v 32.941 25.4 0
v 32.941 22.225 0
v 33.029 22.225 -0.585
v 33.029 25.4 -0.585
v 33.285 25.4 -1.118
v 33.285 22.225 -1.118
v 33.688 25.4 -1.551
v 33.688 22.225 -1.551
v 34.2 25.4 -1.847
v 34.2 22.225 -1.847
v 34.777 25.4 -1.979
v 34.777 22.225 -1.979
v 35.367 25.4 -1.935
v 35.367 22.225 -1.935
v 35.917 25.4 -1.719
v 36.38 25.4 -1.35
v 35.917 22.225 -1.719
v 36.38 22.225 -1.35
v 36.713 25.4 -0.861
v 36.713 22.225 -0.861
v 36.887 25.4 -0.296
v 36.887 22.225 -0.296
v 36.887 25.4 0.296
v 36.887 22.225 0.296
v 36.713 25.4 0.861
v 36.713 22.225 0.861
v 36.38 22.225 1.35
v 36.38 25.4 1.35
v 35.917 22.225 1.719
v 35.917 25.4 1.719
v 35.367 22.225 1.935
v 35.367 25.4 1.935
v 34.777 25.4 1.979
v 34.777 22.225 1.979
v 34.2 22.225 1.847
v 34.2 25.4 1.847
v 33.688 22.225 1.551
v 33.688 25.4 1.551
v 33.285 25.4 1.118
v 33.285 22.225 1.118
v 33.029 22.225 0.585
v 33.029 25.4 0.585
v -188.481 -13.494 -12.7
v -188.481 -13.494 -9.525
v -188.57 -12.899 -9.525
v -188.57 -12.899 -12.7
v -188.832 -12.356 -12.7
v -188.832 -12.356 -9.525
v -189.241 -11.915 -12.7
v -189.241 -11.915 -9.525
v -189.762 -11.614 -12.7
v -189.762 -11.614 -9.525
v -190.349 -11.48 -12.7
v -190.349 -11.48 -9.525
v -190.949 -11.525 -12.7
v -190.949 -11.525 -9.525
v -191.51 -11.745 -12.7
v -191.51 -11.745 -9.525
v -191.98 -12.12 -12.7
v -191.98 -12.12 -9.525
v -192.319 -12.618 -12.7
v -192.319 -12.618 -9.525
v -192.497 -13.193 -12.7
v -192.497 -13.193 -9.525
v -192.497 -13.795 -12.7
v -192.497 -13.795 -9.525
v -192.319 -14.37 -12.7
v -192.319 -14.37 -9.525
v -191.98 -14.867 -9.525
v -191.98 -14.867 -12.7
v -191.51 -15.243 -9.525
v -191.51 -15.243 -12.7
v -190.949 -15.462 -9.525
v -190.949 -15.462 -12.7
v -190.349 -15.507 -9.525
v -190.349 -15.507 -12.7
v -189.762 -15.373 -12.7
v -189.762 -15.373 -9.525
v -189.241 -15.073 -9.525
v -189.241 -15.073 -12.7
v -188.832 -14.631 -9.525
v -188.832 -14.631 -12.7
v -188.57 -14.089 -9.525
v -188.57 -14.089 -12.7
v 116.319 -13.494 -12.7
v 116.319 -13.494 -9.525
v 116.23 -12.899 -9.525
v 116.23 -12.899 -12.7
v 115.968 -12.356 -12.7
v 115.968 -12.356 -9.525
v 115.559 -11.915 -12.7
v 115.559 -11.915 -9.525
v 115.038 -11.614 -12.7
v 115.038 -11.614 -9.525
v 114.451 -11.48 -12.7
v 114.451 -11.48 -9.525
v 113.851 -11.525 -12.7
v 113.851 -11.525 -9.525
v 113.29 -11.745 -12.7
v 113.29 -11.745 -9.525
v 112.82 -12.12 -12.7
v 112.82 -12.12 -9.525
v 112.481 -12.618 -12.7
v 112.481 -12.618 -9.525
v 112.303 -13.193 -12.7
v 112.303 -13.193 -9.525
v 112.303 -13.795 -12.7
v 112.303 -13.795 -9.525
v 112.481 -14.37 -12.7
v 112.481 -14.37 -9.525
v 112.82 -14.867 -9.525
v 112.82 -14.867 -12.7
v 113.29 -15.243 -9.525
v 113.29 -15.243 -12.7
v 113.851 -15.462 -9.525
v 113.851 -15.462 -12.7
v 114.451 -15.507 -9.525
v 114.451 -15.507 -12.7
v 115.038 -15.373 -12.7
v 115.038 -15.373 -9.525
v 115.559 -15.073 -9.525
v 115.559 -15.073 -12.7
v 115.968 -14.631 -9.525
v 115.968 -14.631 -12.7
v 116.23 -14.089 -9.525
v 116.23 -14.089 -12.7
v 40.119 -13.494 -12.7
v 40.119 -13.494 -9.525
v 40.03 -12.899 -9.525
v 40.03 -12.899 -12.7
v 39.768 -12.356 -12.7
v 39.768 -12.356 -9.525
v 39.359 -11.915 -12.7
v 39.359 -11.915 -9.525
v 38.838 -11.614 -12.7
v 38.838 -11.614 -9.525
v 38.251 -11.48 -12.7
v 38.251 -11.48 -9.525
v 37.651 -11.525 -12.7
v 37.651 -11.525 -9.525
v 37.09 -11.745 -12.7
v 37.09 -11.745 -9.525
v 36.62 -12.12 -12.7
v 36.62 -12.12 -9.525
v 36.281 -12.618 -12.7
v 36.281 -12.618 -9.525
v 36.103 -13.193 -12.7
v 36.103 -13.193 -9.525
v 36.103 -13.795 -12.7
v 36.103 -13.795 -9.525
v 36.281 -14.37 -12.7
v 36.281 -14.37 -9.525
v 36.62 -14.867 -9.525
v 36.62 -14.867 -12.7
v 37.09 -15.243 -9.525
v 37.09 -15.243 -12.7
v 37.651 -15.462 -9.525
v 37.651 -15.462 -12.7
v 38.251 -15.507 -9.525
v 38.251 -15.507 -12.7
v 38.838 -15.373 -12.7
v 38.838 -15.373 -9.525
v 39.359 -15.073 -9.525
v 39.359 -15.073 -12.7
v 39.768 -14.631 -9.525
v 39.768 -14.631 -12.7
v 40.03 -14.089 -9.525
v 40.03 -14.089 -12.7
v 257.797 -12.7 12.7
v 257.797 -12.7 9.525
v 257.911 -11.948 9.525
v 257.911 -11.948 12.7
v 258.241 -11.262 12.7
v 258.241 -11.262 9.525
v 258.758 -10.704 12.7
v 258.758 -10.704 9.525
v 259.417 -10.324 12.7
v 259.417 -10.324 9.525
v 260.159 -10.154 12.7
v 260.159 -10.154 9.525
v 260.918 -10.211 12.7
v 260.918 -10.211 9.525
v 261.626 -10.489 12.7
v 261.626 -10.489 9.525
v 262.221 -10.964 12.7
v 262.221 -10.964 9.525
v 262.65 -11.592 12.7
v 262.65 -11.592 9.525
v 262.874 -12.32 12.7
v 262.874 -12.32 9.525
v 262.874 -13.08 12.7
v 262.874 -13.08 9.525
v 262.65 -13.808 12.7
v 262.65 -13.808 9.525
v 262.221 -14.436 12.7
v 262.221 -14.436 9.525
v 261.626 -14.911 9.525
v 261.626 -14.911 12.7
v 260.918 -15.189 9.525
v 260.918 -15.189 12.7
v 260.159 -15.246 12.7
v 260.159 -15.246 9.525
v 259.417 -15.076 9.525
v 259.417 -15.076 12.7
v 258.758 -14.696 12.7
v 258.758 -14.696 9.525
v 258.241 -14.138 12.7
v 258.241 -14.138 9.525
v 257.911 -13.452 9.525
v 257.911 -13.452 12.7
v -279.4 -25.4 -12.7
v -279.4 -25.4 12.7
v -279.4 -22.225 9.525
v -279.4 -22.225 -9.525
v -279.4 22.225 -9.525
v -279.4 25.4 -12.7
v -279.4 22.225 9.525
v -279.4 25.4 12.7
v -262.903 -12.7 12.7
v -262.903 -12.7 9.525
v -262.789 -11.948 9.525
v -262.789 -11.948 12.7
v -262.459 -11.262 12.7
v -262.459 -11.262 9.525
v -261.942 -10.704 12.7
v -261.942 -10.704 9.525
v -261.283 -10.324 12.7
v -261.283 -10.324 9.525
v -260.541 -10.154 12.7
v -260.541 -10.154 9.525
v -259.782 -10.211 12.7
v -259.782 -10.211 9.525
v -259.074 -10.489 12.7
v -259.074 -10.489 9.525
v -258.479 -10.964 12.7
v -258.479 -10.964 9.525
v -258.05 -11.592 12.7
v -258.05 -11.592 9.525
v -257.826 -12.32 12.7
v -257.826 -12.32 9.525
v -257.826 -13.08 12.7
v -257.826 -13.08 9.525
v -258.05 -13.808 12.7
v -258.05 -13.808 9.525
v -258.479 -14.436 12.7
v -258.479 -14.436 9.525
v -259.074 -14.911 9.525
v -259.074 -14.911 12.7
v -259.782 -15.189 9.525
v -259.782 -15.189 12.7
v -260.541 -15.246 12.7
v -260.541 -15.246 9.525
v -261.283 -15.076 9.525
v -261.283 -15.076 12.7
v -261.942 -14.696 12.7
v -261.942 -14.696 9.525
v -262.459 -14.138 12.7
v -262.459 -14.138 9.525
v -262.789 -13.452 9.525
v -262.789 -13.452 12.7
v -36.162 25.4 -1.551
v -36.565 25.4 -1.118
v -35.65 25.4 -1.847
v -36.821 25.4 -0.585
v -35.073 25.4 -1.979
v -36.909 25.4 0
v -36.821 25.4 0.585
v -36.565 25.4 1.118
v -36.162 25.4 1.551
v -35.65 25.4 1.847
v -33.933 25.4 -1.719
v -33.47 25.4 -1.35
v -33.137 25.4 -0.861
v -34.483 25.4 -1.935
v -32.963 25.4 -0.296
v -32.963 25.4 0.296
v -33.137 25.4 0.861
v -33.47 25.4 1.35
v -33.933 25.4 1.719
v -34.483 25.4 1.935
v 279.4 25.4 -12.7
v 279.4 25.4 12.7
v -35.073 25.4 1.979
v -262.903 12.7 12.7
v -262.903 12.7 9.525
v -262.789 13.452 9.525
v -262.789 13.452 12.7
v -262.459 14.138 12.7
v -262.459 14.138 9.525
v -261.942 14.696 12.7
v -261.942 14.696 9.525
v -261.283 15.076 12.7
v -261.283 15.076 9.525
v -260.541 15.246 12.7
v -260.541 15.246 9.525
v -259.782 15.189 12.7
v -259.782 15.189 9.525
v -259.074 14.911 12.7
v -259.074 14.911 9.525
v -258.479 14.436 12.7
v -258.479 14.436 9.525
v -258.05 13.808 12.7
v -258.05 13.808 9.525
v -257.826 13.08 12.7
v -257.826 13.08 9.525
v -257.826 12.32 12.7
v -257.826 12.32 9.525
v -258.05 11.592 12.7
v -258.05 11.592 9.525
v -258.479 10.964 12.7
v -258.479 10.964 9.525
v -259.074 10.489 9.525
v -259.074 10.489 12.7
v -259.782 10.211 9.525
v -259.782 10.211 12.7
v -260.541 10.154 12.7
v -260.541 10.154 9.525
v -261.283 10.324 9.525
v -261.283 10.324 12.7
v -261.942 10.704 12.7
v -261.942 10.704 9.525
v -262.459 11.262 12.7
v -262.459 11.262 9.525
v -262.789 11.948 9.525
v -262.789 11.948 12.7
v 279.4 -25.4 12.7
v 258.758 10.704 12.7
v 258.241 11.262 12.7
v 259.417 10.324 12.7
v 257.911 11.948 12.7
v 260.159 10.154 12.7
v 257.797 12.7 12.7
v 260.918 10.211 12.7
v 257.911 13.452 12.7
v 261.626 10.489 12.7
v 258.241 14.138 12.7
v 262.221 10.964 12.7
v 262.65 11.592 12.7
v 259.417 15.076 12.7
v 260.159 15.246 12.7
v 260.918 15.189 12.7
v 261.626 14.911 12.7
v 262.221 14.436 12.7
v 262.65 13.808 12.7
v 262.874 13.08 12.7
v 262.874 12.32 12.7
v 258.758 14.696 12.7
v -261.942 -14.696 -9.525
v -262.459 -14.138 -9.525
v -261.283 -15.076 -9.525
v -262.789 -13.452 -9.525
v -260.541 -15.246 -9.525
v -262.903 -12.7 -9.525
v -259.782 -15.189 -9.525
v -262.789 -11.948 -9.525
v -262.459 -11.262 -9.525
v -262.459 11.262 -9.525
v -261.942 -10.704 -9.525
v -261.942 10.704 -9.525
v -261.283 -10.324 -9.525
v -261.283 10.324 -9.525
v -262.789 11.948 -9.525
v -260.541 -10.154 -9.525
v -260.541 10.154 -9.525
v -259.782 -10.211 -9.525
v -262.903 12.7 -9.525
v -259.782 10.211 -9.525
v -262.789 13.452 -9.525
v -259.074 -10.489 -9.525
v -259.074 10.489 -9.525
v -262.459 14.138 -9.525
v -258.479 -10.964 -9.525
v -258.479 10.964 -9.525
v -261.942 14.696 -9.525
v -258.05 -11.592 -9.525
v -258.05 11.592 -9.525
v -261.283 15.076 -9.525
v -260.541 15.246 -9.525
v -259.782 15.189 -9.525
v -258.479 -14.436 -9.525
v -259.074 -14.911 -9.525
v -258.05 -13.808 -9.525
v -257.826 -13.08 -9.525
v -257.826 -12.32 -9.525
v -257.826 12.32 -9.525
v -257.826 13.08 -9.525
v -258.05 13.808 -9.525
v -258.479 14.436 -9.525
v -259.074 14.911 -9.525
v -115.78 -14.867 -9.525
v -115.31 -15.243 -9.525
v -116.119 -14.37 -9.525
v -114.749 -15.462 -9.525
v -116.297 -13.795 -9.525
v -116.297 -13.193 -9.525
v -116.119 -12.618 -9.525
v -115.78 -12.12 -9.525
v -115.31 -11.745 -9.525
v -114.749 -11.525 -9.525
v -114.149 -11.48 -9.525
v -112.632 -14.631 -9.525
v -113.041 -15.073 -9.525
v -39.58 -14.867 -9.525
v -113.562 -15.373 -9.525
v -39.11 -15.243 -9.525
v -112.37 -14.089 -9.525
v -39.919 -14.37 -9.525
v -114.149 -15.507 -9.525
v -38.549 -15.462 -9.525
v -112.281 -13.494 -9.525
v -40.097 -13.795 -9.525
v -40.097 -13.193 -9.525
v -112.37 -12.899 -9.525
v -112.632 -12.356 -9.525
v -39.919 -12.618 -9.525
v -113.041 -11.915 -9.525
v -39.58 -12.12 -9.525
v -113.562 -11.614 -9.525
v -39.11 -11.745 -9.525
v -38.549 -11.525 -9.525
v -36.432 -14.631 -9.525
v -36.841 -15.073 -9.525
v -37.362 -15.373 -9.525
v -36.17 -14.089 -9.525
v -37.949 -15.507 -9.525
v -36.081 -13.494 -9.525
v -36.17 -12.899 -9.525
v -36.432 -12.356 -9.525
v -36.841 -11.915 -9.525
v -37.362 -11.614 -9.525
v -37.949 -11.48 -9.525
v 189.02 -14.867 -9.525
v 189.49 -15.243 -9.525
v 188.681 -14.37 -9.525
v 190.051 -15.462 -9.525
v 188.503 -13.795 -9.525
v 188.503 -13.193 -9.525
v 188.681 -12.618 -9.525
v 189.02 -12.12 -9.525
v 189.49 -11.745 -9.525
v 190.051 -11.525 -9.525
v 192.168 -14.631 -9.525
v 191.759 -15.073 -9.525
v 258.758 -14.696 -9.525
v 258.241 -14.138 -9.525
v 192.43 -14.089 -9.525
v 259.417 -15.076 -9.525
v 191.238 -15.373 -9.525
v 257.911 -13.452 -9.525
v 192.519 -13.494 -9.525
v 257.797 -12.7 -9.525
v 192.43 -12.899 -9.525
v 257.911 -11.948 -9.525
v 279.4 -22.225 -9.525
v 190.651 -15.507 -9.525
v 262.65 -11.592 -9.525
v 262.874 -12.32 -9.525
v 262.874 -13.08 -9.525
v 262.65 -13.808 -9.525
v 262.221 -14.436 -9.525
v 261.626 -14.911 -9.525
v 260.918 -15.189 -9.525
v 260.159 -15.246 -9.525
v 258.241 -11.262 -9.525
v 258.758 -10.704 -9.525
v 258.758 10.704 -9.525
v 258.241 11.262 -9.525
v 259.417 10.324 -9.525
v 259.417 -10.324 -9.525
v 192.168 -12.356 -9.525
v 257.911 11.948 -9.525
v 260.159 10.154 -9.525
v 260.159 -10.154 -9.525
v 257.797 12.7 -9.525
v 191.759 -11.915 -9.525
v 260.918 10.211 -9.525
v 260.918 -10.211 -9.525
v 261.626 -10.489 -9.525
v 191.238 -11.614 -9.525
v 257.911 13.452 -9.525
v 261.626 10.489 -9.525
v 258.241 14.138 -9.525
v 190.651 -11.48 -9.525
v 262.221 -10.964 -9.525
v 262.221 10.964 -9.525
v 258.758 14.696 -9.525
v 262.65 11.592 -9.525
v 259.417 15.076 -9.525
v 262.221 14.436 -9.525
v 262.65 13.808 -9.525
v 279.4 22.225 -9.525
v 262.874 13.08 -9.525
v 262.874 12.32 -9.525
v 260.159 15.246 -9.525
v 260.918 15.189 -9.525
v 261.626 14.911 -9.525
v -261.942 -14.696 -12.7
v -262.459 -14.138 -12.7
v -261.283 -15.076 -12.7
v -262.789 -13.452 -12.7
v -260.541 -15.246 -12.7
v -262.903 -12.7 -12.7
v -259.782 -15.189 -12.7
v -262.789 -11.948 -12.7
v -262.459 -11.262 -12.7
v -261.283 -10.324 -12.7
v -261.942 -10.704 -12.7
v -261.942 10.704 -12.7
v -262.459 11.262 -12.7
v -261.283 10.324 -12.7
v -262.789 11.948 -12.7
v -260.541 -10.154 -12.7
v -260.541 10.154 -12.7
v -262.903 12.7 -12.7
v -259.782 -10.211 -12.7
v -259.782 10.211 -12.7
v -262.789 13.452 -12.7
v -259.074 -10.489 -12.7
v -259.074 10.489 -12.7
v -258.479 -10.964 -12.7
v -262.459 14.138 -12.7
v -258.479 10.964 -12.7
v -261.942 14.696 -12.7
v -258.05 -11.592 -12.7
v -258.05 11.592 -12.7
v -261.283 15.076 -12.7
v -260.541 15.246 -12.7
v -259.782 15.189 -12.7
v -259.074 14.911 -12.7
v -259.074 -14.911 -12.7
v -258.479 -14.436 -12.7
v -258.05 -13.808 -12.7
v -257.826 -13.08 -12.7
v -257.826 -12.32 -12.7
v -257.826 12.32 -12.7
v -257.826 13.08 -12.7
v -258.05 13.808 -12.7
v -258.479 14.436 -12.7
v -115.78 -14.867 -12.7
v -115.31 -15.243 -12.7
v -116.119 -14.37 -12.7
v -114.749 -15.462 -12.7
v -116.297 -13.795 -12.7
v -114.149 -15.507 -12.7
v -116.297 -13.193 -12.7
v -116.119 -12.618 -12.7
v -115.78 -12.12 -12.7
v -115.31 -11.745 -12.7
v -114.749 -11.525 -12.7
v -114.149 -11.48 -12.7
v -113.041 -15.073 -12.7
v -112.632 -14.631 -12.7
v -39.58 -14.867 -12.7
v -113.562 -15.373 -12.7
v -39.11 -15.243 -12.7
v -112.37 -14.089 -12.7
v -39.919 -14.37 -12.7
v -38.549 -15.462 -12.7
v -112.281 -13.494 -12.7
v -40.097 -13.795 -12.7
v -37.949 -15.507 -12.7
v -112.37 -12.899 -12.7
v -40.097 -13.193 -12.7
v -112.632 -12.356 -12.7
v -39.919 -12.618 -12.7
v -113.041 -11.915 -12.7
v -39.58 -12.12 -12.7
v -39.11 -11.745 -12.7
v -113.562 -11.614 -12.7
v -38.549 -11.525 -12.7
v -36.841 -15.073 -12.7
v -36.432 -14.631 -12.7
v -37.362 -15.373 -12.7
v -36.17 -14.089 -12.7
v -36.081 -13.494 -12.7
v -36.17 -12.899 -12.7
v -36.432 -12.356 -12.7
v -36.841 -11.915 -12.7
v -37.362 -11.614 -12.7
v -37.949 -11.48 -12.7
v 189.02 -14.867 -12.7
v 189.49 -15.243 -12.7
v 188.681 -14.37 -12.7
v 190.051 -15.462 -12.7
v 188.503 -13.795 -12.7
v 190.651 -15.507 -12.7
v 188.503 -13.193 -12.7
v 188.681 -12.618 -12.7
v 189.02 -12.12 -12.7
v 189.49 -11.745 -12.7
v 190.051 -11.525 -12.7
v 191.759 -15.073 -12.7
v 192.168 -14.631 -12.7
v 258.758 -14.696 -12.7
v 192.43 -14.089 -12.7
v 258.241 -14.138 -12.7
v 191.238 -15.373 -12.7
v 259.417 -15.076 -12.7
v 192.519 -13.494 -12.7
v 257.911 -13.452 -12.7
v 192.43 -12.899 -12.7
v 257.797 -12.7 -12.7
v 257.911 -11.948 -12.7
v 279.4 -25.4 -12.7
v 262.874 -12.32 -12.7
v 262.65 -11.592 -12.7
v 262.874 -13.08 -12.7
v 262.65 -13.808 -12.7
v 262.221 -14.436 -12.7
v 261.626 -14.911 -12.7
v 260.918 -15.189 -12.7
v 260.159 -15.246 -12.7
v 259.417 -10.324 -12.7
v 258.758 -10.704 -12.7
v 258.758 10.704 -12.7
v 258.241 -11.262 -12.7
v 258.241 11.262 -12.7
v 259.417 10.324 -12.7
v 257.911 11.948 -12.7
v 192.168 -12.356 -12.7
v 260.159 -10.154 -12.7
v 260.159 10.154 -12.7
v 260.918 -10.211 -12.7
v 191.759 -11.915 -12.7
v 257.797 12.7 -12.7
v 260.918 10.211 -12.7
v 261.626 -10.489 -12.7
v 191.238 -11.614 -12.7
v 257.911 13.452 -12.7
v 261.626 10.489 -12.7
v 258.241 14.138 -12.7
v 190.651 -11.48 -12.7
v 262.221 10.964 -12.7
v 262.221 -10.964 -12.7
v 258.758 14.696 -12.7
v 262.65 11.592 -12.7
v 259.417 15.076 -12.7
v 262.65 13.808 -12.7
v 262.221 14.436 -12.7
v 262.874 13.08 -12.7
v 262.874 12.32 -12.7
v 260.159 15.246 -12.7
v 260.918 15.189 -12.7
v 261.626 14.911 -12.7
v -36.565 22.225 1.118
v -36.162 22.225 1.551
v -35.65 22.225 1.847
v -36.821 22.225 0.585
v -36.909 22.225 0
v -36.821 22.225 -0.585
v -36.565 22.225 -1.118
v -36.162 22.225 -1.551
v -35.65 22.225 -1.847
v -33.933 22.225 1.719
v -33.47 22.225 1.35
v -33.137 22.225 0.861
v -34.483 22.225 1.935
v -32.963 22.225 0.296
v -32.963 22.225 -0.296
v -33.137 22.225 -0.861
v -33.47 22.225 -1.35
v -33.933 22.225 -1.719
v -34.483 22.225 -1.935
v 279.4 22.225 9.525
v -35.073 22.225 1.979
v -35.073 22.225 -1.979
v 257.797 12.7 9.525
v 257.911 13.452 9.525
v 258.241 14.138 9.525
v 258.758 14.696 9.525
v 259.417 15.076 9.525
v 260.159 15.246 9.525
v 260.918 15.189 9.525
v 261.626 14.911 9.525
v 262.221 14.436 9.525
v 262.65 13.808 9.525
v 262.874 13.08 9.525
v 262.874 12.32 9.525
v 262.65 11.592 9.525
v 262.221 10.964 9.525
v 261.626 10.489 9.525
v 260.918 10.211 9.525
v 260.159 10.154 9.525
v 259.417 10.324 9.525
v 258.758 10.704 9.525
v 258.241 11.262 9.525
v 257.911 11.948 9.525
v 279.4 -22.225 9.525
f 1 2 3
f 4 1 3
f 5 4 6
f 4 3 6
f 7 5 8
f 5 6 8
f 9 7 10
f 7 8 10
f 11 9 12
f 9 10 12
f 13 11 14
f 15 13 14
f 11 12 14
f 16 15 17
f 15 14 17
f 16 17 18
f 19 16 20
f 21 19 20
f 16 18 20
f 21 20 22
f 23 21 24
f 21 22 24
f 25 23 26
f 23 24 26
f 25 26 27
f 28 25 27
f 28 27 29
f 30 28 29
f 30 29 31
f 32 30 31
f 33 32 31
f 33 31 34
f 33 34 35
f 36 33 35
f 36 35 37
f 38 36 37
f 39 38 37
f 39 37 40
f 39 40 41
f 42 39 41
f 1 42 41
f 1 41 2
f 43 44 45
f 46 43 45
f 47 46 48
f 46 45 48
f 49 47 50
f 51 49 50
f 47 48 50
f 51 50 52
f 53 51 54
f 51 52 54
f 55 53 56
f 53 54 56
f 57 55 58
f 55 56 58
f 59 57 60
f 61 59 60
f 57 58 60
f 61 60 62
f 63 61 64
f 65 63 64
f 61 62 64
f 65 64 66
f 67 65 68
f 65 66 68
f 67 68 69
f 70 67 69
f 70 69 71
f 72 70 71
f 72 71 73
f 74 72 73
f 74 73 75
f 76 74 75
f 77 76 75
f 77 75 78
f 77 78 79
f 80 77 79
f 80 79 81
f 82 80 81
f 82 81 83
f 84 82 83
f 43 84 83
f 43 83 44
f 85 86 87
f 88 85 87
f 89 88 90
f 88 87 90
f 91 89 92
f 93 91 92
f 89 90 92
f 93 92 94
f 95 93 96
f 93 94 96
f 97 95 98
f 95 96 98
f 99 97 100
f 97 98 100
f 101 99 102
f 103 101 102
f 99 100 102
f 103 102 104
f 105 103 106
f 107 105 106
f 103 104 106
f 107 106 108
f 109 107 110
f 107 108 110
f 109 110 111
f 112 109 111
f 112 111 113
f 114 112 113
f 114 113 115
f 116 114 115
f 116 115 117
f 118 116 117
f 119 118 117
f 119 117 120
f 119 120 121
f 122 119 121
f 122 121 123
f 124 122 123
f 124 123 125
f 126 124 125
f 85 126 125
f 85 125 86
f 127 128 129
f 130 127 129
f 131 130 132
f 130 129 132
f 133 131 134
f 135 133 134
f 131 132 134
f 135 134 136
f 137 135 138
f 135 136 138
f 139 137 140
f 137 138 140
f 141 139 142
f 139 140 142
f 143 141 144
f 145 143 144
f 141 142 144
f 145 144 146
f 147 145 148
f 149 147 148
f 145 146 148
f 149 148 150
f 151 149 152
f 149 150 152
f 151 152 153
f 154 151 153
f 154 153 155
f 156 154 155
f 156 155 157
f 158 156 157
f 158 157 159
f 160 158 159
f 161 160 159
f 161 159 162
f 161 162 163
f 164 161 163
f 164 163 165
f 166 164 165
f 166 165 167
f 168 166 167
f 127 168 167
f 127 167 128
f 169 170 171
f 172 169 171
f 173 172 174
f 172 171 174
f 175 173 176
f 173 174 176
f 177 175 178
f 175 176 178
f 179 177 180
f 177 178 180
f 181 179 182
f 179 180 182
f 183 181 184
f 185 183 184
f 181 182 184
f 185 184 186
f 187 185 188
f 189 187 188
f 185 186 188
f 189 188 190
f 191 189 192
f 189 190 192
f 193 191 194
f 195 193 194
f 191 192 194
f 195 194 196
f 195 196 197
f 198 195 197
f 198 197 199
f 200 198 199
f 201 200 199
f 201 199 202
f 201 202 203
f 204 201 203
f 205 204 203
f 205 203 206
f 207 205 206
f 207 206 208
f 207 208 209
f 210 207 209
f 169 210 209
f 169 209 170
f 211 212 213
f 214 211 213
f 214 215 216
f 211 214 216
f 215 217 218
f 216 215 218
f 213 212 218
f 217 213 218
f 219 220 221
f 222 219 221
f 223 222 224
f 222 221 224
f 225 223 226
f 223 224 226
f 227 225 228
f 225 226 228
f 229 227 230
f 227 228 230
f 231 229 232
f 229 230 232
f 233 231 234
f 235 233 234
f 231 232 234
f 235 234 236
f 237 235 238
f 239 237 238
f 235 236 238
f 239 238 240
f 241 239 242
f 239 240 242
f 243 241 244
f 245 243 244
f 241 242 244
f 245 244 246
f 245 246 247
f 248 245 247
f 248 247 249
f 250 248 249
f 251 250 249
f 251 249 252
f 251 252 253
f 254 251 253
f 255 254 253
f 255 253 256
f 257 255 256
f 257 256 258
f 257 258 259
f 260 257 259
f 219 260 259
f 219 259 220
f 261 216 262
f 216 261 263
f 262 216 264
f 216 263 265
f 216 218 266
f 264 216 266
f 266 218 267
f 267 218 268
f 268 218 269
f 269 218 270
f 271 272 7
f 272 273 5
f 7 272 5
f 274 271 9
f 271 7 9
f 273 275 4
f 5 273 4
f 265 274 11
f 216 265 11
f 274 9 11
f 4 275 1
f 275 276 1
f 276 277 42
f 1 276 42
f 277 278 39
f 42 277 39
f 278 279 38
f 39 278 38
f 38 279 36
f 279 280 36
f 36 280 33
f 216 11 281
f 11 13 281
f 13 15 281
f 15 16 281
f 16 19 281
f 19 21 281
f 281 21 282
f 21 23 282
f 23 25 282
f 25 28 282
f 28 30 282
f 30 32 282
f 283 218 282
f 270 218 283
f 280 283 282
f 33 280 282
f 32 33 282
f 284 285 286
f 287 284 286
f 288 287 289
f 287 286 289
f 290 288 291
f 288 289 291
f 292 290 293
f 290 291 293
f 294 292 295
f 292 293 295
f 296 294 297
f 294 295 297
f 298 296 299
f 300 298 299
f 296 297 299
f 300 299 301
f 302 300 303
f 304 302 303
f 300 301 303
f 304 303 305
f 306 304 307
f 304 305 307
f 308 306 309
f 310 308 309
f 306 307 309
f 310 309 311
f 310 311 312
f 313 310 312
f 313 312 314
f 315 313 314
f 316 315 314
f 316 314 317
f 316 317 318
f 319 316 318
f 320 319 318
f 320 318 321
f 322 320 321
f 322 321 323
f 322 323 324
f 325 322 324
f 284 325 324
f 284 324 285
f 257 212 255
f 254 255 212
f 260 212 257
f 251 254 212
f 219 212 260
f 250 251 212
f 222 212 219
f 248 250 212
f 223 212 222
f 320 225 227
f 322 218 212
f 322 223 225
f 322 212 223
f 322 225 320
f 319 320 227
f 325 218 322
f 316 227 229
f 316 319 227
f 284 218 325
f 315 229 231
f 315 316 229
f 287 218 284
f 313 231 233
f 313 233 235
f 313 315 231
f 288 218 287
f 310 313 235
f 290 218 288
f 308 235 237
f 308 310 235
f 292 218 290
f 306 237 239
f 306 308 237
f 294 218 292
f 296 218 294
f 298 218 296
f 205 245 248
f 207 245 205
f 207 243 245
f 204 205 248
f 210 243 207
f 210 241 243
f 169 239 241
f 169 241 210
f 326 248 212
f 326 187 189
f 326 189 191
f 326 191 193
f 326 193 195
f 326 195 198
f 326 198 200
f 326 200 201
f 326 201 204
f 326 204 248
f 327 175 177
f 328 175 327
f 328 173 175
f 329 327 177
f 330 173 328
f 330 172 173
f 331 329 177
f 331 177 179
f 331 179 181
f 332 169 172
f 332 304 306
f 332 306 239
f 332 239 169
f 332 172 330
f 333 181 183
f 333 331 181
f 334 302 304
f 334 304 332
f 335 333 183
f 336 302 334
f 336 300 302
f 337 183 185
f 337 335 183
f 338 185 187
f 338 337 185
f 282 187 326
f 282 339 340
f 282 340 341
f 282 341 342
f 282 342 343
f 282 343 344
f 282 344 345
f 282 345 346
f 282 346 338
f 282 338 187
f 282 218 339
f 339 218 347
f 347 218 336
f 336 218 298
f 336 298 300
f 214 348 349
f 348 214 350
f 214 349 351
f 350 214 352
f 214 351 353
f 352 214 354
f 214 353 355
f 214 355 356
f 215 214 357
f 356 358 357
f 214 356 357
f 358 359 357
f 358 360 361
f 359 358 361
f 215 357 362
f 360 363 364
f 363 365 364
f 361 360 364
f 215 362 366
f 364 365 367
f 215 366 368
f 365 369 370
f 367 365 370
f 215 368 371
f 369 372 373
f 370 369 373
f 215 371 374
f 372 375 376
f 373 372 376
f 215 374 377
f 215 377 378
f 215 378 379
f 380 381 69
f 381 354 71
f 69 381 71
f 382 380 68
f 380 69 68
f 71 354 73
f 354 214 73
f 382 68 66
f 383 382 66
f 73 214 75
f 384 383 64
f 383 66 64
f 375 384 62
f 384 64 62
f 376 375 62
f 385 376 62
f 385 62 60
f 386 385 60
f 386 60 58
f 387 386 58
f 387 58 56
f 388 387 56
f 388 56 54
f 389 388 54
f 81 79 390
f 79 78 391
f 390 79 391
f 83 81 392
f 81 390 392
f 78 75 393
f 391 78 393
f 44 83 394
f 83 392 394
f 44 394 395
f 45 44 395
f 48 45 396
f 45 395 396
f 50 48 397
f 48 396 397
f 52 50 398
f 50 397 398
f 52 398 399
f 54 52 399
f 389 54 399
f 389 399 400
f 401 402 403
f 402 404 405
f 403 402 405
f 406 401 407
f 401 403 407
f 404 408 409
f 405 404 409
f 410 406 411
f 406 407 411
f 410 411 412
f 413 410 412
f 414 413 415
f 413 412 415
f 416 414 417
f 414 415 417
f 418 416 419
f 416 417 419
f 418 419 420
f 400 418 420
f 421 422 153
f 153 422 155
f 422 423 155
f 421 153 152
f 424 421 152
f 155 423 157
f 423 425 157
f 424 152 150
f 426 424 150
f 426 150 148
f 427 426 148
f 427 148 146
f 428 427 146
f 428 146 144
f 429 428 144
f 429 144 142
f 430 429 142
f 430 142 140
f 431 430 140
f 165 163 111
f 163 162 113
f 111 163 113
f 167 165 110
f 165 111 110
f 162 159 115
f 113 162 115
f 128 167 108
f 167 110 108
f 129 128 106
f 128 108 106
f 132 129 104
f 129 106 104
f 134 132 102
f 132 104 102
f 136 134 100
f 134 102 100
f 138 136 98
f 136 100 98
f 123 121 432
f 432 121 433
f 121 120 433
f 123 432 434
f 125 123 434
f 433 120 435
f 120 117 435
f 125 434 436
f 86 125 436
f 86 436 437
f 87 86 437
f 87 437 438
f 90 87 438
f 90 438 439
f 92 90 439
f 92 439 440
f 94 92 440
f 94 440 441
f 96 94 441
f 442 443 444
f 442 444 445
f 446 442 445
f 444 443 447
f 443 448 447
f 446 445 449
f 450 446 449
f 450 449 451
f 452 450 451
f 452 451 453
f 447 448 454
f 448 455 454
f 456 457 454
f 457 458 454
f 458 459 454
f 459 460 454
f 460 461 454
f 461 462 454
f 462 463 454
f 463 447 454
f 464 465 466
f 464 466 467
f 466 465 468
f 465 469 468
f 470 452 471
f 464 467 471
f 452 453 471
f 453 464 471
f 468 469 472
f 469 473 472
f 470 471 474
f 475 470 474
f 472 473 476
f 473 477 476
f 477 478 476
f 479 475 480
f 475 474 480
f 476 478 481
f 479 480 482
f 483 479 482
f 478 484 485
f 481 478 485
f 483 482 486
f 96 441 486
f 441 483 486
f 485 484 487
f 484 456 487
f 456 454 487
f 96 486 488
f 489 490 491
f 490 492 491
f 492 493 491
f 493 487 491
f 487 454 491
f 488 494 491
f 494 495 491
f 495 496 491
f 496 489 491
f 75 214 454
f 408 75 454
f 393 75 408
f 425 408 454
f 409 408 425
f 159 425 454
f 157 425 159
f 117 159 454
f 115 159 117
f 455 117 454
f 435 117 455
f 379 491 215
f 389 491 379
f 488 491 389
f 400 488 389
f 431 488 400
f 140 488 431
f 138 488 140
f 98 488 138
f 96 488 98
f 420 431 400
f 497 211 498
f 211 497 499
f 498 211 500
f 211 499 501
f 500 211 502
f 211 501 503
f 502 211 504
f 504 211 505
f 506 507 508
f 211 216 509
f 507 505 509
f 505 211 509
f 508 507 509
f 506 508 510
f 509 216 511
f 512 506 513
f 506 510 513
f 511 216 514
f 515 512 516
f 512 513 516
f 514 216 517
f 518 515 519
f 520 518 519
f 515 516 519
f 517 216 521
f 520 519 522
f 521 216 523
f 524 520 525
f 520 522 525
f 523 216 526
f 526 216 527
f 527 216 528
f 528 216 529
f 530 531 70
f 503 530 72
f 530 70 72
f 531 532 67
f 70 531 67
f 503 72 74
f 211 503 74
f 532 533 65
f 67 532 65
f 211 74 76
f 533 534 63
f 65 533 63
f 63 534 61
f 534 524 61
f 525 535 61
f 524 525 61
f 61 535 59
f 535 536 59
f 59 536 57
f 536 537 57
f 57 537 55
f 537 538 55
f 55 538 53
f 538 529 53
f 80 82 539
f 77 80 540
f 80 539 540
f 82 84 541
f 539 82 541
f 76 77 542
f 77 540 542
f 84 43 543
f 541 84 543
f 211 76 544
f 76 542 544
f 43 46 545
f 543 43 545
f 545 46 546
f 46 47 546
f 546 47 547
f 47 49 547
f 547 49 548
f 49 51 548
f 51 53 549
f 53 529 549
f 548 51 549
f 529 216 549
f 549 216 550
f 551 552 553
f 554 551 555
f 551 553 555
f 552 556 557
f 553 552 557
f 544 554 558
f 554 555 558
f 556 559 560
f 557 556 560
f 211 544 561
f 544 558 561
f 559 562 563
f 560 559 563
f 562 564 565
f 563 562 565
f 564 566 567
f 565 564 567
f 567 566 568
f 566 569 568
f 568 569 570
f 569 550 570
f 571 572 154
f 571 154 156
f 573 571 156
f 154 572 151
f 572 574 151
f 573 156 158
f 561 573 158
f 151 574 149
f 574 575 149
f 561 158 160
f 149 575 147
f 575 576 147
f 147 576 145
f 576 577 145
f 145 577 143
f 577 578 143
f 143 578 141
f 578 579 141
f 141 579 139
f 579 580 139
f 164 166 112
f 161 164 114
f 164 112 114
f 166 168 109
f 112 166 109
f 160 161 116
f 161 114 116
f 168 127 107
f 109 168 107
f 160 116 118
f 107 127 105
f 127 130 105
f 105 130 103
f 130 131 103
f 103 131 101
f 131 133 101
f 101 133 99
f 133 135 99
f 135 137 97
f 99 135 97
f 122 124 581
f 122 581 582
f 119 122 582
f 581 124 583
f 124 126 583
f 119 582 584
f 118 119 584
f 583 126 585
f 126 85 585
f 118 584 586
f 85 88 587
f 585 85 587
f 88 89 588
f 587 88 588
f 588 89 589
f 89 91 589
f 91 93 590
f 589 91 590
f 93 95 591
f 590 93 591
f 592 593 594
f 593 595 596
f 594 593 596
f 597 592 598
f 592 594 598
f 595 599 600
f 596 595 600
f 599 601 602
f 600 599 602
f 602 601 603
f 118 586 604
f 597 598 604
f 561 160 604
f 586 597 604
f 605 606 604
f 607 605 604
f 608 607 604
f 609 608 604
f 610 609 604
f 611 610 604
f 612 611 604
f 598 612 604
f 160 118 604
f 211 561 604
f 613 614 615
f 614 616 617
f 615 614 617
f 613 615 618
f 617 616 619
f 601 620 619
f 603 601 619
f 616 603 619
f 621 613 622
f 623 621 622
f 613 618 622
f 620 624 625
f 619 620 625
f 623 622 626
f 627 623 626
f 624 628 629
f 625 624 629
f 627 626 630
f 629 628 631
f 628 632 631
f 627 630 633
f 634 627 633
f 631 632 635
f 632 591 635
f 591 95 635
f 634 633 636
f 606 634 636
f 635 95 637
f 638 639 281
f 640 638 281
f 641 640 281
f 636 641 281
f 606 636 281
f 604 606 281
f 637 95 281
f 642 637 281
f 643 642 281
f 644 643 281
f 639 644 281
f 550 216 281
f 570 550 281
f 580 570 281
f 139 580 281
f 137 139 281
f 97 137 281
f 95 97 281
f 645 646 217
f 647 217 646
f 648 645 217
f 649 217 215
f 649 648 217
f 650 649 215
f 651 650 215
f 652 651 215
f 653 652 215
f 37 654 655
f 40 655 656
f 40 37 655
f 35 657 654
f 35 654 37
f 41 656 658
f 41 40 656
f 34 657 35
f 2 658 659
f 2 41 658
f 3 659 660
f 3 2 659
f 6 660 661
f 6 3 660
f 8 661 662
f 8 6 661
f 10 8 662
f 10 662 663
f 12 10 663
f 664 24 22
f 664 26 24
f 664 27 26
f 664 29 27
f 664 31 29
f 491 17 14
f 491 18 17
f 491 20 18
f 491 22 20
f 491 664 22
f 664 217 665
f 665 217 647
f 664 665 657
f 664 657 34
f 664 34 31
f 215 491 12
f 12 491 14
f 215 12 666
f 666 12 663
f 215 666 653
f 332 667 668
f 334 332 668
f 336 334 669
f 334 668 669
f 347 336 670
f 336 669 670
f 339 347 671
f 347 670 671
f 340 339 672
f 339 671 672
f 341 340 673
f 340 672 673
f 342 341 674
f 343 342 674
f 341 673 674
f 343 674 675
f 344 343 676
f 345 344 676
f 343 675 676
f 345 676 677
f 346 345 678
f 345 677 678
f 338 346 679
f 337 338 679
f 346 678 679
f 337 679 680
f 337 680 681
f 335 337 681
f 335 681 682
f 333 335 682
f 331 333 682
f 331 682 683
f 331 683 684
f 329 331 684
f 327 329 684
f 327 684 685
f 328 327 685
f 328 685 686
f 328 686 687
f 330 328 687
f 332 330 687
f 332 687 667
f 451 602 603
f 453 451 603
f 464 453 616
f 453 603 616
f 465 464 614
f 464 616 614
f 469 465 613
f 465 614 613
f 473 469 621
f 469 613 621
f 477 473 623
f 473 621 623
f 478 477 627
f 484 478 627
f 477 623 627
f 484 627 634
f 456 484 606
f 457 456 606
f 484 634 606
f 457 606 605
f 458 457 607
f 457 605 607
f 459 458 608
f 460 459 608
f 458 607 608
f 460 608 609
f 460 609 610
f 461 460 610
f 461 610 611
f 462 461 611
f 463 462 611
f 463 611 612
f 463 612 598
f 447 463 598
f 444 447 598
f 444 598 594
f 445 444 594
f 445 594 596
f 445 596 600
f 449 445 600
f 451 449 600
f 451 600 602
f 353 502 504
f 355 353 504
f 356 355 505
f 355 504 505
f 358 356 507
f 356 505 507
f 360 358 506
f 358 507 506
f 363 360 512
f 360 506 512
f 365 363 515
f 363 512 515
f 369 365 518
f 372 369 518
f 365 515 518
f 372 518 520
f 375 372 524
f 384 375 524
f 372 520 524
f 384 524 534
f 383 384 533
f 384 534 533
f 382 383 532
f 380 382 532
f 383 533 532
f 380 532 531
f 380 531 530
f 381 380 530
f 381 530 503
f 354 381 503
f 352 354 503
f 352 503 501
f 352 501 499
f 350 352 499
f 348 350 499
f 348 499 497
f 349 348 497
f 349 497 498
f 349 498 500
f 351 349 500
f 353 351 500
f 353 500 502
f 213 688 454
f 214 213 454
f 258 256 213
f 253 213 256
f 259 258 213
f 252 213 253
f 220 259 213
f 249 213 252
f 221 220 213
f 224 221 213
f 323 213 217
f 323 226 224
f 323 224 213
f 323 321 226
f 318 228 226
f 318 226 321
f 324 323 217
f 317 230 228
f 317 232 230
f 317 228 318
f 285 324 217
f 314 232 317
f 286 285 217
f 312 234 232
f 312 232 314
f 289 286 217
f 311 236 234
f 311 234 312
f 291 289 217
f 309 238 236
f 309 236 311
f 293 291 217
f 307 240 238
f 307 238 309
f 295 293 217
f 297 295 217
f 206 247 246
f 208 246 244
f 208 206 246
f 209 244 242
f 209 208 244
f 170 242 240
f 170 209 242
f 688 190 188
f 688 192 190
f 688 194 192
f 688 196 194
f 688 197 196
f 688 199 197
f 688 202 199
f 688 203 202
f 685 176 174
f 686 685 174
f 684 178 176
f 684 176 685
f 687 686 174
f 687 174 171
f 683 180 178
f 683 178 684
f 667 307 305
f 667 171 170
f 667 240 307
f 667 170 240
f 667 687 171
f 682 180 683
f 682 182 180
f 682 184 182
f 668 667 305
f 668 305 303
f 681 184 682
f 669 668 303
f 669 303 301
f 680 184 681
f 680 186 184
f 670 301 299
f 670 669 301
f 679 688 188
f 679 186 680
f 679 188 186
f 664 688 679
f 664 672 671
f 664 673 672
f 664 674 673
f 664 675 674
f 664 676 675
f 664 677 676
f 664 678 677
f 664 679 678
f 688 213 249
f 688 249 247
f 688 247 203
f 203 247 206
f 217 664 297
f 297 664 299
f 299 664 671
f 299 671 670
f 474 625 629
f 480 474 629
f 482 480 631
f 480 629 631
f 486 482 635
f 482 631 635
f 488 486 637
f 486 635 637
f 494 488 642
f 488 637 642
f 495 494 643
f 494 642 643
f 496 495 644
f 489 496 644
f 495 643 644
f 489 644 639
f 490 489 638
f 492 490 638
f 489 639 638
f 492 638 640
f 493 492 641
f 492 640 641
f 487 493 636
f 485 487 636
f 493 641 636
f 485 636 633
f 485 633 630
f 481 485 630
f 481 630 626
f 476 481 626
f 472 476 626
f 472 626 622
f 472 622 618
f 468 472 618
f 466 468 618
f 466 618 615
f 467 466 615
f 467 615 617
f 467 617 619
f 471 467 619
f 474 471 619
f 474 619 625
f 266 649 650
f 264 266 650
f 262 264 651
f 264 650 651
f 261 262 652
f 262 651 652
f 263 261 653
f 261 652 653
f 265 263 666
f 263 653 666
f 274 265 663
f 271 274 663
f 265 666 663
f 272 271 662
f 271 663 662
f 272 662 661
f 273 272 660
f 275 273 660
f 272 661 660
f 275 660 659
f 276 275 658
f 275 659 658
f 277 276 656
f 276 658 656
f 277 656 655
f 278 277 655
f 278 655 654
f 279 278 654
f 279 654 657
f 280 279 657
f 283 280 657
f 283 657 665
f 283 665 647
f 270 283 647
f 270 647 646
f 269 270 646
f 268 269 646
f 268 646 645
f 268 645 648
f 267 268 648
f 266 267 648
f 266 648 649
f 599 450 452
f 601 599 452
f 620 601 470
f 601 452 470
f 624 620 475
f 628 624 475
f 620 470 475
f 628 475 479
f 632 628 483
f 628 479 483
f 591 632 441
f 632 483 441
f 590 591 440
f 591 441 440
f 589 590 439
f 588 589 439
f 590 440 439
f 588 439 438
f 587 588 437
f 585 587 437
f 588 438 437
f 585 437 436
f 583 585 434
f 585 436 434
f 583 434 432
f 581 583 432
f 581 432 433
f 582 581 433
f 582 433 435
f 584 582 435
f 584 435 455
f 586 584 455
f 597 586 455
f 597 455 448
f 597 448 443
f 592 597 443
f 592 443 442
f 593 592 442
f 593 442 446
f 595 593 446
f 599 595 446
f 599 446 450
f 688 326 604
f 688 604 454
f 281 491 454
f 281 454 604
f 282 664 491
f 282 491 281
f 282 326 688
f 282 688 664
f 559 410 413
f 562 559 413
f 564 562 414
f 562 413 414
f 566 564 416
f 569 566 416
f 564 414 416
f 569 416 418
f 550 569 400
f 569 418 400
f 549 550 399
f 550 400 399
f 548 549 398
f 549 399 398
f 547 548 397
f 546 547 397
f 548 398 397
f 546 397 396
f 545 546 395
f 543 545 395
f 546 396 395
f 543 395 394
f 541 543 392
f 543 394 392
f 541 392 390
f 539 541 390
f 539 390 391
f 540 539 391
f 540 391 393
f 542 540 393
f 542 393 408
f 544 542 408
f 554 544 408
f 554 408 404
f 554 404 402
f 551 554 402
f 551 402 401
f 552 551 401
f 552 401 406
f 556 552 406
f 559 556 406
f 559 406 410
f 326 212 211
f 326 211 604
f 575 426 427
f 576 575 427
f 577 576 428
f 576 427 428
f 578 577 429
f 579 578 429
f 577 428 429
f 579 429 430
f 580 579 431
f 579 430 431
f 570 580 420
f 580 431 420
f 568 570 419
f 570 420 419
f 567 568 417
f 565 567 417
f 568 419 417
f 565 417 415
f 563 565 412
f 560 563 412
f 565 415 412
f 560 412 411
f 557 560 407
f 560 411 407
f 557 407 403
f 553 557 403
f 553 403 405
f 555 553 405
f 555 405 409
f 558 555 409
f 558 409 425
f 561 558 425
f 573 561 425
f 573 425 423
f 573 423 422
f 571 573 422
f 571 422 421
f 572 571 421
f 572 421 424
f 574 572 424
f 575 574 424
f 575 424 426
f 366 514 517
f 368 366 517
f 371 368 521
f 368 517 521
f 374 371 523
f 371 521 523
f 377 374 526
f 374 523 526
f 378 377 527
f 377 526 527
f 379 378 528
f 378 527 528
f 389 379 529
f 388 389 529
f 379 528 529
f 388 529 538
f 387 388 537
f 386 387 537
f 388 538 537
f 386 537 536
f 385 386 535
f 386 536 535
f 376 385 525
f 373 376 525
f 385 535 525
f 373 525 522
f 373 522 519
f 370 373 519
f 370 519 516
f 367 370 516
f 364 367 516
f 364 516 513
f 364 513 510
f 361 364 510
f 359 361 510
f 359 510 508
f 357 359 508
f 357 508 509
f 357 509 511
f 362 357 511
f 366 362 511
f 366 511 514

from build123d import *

# Parameters (mm, degrees)
SKETCH1_W                           = 558.8
SKETCH1_H                           = 50.8
BOSS_EXTRUDE1_DEPTH                 = 12.7
SKETCH2_W                           = 19.05
SKETCH2_H                           = 44.45
CUT_EXTRUDE1_DEPTH                  = 560.521125607
F_1_4_20_TAPPED_HOLE1_D             = 5.1054
F_10_32_TAPPED_HOLE1_D              = 4.0386
F_10_32_TAPPED_HOLE1_DEPTH          = 5.08
F_10_32_TAPPED_HOLE1_TIP            = 1.213317848
F_5_32_0_15625_DIAMETER_HOLE1_D     = 3.96875
F_5_32_0_15625_DIAMETER_HOLE1_DEPTH = 5.08
F_5_32_0_15625_DIAMETER_HOLE1_TIP   = 1.192332791


with BuildPart() as part:
    # Sketch1 → Boss-Extrude1 (new, symmetric)
    with BuildSketch(Plane.XY):
        Rectangle(SKETCH1_W, SKETCH1_H)
    extrude(amount=BOSS_EXTRUDE1_DEPTH, both=True)

    # Sketch2 → Cut-Extrude1 (cut, through all)
    with BuildSketch(Plane(origin=(279.4, 0, 0), x_dir=(0, 0, -1), z_dir=(1, 0, 0))):
        Rectangle(SKETCH2_W, SKETCH2_H)
    extrude(amount=-CUT_EXTRUDE1_DEPTH, mode=Mode.SUBTRACT)

    # 1/4-20 Tapped Hole1 (through all)
    with Locations(Plane.XY.offset(12.7)):
        with Locations((-260.35, 12.7), (-260.35, -12.7), (260.35, 12.7), (260.35, -12.7)):
            Hole(F_1_4_20_TAPPED_HOLE1_D / 2)

    # #10-32 Tapped Hole1
    with Locations(Plane(origin=(0, 0, -12.7), x_dir=(-1, 0, 0), z_dir=(0, 0, -1))):
        with Locations((-190.5, -13.49375), (-114.3, -13.49375), (-38.1, -13.49375), (38.1, -13.49375), (114.3, -13.49375), (190.5, -13.49375)):
            Hole(F_10_32_TAPPED_HOLE1_D / 2, depth=F_10_32_TAPPED_HOLE1_DEPTH)
            with Locations((0, 0, -(F_10_32_TAPPED_HOLE1_DEPTH + F_10_32_TAPPED_HOLE1_TIP / 2))):  # 118° drill point
                Cone(0, F_10_32_TAPPED_HOLE1_D / 2, F_10_32_TAPPED_HOLE1_TIP, mode=Mode.SUBTRACT)

    # 5/32 (0.15625) Diameter Hole1
    with Locations(Plane(origin=(0, 25.4, 0), x_dir=(1, 0, 0), z_dir=(0, 1, 0))):
        with Locations((-34.925, 0), (34.925, 0)):
            Hole(F_5_32_0_15625_DIAMETER_HOLE1_D / 2, depth=F_5_32_0_15625_DIAMETER_HOLE1_DEPTH)
            with Locations((0, 0, -(F_5_32_0_15625_DIAMETER_HOLE1_DEPTH + F_5_32_0_15625_DIAMETER_HOLE1_TIP / 2))):  # 118° drill point
                Cone(0, F_5_32_0_15625_DIAMETER_HOLE1_D / 2, F_5_32_0_15625_DIAMETER_HOLE1_TIP, mode=Mode.SUBTRACT)


solid = part.part
